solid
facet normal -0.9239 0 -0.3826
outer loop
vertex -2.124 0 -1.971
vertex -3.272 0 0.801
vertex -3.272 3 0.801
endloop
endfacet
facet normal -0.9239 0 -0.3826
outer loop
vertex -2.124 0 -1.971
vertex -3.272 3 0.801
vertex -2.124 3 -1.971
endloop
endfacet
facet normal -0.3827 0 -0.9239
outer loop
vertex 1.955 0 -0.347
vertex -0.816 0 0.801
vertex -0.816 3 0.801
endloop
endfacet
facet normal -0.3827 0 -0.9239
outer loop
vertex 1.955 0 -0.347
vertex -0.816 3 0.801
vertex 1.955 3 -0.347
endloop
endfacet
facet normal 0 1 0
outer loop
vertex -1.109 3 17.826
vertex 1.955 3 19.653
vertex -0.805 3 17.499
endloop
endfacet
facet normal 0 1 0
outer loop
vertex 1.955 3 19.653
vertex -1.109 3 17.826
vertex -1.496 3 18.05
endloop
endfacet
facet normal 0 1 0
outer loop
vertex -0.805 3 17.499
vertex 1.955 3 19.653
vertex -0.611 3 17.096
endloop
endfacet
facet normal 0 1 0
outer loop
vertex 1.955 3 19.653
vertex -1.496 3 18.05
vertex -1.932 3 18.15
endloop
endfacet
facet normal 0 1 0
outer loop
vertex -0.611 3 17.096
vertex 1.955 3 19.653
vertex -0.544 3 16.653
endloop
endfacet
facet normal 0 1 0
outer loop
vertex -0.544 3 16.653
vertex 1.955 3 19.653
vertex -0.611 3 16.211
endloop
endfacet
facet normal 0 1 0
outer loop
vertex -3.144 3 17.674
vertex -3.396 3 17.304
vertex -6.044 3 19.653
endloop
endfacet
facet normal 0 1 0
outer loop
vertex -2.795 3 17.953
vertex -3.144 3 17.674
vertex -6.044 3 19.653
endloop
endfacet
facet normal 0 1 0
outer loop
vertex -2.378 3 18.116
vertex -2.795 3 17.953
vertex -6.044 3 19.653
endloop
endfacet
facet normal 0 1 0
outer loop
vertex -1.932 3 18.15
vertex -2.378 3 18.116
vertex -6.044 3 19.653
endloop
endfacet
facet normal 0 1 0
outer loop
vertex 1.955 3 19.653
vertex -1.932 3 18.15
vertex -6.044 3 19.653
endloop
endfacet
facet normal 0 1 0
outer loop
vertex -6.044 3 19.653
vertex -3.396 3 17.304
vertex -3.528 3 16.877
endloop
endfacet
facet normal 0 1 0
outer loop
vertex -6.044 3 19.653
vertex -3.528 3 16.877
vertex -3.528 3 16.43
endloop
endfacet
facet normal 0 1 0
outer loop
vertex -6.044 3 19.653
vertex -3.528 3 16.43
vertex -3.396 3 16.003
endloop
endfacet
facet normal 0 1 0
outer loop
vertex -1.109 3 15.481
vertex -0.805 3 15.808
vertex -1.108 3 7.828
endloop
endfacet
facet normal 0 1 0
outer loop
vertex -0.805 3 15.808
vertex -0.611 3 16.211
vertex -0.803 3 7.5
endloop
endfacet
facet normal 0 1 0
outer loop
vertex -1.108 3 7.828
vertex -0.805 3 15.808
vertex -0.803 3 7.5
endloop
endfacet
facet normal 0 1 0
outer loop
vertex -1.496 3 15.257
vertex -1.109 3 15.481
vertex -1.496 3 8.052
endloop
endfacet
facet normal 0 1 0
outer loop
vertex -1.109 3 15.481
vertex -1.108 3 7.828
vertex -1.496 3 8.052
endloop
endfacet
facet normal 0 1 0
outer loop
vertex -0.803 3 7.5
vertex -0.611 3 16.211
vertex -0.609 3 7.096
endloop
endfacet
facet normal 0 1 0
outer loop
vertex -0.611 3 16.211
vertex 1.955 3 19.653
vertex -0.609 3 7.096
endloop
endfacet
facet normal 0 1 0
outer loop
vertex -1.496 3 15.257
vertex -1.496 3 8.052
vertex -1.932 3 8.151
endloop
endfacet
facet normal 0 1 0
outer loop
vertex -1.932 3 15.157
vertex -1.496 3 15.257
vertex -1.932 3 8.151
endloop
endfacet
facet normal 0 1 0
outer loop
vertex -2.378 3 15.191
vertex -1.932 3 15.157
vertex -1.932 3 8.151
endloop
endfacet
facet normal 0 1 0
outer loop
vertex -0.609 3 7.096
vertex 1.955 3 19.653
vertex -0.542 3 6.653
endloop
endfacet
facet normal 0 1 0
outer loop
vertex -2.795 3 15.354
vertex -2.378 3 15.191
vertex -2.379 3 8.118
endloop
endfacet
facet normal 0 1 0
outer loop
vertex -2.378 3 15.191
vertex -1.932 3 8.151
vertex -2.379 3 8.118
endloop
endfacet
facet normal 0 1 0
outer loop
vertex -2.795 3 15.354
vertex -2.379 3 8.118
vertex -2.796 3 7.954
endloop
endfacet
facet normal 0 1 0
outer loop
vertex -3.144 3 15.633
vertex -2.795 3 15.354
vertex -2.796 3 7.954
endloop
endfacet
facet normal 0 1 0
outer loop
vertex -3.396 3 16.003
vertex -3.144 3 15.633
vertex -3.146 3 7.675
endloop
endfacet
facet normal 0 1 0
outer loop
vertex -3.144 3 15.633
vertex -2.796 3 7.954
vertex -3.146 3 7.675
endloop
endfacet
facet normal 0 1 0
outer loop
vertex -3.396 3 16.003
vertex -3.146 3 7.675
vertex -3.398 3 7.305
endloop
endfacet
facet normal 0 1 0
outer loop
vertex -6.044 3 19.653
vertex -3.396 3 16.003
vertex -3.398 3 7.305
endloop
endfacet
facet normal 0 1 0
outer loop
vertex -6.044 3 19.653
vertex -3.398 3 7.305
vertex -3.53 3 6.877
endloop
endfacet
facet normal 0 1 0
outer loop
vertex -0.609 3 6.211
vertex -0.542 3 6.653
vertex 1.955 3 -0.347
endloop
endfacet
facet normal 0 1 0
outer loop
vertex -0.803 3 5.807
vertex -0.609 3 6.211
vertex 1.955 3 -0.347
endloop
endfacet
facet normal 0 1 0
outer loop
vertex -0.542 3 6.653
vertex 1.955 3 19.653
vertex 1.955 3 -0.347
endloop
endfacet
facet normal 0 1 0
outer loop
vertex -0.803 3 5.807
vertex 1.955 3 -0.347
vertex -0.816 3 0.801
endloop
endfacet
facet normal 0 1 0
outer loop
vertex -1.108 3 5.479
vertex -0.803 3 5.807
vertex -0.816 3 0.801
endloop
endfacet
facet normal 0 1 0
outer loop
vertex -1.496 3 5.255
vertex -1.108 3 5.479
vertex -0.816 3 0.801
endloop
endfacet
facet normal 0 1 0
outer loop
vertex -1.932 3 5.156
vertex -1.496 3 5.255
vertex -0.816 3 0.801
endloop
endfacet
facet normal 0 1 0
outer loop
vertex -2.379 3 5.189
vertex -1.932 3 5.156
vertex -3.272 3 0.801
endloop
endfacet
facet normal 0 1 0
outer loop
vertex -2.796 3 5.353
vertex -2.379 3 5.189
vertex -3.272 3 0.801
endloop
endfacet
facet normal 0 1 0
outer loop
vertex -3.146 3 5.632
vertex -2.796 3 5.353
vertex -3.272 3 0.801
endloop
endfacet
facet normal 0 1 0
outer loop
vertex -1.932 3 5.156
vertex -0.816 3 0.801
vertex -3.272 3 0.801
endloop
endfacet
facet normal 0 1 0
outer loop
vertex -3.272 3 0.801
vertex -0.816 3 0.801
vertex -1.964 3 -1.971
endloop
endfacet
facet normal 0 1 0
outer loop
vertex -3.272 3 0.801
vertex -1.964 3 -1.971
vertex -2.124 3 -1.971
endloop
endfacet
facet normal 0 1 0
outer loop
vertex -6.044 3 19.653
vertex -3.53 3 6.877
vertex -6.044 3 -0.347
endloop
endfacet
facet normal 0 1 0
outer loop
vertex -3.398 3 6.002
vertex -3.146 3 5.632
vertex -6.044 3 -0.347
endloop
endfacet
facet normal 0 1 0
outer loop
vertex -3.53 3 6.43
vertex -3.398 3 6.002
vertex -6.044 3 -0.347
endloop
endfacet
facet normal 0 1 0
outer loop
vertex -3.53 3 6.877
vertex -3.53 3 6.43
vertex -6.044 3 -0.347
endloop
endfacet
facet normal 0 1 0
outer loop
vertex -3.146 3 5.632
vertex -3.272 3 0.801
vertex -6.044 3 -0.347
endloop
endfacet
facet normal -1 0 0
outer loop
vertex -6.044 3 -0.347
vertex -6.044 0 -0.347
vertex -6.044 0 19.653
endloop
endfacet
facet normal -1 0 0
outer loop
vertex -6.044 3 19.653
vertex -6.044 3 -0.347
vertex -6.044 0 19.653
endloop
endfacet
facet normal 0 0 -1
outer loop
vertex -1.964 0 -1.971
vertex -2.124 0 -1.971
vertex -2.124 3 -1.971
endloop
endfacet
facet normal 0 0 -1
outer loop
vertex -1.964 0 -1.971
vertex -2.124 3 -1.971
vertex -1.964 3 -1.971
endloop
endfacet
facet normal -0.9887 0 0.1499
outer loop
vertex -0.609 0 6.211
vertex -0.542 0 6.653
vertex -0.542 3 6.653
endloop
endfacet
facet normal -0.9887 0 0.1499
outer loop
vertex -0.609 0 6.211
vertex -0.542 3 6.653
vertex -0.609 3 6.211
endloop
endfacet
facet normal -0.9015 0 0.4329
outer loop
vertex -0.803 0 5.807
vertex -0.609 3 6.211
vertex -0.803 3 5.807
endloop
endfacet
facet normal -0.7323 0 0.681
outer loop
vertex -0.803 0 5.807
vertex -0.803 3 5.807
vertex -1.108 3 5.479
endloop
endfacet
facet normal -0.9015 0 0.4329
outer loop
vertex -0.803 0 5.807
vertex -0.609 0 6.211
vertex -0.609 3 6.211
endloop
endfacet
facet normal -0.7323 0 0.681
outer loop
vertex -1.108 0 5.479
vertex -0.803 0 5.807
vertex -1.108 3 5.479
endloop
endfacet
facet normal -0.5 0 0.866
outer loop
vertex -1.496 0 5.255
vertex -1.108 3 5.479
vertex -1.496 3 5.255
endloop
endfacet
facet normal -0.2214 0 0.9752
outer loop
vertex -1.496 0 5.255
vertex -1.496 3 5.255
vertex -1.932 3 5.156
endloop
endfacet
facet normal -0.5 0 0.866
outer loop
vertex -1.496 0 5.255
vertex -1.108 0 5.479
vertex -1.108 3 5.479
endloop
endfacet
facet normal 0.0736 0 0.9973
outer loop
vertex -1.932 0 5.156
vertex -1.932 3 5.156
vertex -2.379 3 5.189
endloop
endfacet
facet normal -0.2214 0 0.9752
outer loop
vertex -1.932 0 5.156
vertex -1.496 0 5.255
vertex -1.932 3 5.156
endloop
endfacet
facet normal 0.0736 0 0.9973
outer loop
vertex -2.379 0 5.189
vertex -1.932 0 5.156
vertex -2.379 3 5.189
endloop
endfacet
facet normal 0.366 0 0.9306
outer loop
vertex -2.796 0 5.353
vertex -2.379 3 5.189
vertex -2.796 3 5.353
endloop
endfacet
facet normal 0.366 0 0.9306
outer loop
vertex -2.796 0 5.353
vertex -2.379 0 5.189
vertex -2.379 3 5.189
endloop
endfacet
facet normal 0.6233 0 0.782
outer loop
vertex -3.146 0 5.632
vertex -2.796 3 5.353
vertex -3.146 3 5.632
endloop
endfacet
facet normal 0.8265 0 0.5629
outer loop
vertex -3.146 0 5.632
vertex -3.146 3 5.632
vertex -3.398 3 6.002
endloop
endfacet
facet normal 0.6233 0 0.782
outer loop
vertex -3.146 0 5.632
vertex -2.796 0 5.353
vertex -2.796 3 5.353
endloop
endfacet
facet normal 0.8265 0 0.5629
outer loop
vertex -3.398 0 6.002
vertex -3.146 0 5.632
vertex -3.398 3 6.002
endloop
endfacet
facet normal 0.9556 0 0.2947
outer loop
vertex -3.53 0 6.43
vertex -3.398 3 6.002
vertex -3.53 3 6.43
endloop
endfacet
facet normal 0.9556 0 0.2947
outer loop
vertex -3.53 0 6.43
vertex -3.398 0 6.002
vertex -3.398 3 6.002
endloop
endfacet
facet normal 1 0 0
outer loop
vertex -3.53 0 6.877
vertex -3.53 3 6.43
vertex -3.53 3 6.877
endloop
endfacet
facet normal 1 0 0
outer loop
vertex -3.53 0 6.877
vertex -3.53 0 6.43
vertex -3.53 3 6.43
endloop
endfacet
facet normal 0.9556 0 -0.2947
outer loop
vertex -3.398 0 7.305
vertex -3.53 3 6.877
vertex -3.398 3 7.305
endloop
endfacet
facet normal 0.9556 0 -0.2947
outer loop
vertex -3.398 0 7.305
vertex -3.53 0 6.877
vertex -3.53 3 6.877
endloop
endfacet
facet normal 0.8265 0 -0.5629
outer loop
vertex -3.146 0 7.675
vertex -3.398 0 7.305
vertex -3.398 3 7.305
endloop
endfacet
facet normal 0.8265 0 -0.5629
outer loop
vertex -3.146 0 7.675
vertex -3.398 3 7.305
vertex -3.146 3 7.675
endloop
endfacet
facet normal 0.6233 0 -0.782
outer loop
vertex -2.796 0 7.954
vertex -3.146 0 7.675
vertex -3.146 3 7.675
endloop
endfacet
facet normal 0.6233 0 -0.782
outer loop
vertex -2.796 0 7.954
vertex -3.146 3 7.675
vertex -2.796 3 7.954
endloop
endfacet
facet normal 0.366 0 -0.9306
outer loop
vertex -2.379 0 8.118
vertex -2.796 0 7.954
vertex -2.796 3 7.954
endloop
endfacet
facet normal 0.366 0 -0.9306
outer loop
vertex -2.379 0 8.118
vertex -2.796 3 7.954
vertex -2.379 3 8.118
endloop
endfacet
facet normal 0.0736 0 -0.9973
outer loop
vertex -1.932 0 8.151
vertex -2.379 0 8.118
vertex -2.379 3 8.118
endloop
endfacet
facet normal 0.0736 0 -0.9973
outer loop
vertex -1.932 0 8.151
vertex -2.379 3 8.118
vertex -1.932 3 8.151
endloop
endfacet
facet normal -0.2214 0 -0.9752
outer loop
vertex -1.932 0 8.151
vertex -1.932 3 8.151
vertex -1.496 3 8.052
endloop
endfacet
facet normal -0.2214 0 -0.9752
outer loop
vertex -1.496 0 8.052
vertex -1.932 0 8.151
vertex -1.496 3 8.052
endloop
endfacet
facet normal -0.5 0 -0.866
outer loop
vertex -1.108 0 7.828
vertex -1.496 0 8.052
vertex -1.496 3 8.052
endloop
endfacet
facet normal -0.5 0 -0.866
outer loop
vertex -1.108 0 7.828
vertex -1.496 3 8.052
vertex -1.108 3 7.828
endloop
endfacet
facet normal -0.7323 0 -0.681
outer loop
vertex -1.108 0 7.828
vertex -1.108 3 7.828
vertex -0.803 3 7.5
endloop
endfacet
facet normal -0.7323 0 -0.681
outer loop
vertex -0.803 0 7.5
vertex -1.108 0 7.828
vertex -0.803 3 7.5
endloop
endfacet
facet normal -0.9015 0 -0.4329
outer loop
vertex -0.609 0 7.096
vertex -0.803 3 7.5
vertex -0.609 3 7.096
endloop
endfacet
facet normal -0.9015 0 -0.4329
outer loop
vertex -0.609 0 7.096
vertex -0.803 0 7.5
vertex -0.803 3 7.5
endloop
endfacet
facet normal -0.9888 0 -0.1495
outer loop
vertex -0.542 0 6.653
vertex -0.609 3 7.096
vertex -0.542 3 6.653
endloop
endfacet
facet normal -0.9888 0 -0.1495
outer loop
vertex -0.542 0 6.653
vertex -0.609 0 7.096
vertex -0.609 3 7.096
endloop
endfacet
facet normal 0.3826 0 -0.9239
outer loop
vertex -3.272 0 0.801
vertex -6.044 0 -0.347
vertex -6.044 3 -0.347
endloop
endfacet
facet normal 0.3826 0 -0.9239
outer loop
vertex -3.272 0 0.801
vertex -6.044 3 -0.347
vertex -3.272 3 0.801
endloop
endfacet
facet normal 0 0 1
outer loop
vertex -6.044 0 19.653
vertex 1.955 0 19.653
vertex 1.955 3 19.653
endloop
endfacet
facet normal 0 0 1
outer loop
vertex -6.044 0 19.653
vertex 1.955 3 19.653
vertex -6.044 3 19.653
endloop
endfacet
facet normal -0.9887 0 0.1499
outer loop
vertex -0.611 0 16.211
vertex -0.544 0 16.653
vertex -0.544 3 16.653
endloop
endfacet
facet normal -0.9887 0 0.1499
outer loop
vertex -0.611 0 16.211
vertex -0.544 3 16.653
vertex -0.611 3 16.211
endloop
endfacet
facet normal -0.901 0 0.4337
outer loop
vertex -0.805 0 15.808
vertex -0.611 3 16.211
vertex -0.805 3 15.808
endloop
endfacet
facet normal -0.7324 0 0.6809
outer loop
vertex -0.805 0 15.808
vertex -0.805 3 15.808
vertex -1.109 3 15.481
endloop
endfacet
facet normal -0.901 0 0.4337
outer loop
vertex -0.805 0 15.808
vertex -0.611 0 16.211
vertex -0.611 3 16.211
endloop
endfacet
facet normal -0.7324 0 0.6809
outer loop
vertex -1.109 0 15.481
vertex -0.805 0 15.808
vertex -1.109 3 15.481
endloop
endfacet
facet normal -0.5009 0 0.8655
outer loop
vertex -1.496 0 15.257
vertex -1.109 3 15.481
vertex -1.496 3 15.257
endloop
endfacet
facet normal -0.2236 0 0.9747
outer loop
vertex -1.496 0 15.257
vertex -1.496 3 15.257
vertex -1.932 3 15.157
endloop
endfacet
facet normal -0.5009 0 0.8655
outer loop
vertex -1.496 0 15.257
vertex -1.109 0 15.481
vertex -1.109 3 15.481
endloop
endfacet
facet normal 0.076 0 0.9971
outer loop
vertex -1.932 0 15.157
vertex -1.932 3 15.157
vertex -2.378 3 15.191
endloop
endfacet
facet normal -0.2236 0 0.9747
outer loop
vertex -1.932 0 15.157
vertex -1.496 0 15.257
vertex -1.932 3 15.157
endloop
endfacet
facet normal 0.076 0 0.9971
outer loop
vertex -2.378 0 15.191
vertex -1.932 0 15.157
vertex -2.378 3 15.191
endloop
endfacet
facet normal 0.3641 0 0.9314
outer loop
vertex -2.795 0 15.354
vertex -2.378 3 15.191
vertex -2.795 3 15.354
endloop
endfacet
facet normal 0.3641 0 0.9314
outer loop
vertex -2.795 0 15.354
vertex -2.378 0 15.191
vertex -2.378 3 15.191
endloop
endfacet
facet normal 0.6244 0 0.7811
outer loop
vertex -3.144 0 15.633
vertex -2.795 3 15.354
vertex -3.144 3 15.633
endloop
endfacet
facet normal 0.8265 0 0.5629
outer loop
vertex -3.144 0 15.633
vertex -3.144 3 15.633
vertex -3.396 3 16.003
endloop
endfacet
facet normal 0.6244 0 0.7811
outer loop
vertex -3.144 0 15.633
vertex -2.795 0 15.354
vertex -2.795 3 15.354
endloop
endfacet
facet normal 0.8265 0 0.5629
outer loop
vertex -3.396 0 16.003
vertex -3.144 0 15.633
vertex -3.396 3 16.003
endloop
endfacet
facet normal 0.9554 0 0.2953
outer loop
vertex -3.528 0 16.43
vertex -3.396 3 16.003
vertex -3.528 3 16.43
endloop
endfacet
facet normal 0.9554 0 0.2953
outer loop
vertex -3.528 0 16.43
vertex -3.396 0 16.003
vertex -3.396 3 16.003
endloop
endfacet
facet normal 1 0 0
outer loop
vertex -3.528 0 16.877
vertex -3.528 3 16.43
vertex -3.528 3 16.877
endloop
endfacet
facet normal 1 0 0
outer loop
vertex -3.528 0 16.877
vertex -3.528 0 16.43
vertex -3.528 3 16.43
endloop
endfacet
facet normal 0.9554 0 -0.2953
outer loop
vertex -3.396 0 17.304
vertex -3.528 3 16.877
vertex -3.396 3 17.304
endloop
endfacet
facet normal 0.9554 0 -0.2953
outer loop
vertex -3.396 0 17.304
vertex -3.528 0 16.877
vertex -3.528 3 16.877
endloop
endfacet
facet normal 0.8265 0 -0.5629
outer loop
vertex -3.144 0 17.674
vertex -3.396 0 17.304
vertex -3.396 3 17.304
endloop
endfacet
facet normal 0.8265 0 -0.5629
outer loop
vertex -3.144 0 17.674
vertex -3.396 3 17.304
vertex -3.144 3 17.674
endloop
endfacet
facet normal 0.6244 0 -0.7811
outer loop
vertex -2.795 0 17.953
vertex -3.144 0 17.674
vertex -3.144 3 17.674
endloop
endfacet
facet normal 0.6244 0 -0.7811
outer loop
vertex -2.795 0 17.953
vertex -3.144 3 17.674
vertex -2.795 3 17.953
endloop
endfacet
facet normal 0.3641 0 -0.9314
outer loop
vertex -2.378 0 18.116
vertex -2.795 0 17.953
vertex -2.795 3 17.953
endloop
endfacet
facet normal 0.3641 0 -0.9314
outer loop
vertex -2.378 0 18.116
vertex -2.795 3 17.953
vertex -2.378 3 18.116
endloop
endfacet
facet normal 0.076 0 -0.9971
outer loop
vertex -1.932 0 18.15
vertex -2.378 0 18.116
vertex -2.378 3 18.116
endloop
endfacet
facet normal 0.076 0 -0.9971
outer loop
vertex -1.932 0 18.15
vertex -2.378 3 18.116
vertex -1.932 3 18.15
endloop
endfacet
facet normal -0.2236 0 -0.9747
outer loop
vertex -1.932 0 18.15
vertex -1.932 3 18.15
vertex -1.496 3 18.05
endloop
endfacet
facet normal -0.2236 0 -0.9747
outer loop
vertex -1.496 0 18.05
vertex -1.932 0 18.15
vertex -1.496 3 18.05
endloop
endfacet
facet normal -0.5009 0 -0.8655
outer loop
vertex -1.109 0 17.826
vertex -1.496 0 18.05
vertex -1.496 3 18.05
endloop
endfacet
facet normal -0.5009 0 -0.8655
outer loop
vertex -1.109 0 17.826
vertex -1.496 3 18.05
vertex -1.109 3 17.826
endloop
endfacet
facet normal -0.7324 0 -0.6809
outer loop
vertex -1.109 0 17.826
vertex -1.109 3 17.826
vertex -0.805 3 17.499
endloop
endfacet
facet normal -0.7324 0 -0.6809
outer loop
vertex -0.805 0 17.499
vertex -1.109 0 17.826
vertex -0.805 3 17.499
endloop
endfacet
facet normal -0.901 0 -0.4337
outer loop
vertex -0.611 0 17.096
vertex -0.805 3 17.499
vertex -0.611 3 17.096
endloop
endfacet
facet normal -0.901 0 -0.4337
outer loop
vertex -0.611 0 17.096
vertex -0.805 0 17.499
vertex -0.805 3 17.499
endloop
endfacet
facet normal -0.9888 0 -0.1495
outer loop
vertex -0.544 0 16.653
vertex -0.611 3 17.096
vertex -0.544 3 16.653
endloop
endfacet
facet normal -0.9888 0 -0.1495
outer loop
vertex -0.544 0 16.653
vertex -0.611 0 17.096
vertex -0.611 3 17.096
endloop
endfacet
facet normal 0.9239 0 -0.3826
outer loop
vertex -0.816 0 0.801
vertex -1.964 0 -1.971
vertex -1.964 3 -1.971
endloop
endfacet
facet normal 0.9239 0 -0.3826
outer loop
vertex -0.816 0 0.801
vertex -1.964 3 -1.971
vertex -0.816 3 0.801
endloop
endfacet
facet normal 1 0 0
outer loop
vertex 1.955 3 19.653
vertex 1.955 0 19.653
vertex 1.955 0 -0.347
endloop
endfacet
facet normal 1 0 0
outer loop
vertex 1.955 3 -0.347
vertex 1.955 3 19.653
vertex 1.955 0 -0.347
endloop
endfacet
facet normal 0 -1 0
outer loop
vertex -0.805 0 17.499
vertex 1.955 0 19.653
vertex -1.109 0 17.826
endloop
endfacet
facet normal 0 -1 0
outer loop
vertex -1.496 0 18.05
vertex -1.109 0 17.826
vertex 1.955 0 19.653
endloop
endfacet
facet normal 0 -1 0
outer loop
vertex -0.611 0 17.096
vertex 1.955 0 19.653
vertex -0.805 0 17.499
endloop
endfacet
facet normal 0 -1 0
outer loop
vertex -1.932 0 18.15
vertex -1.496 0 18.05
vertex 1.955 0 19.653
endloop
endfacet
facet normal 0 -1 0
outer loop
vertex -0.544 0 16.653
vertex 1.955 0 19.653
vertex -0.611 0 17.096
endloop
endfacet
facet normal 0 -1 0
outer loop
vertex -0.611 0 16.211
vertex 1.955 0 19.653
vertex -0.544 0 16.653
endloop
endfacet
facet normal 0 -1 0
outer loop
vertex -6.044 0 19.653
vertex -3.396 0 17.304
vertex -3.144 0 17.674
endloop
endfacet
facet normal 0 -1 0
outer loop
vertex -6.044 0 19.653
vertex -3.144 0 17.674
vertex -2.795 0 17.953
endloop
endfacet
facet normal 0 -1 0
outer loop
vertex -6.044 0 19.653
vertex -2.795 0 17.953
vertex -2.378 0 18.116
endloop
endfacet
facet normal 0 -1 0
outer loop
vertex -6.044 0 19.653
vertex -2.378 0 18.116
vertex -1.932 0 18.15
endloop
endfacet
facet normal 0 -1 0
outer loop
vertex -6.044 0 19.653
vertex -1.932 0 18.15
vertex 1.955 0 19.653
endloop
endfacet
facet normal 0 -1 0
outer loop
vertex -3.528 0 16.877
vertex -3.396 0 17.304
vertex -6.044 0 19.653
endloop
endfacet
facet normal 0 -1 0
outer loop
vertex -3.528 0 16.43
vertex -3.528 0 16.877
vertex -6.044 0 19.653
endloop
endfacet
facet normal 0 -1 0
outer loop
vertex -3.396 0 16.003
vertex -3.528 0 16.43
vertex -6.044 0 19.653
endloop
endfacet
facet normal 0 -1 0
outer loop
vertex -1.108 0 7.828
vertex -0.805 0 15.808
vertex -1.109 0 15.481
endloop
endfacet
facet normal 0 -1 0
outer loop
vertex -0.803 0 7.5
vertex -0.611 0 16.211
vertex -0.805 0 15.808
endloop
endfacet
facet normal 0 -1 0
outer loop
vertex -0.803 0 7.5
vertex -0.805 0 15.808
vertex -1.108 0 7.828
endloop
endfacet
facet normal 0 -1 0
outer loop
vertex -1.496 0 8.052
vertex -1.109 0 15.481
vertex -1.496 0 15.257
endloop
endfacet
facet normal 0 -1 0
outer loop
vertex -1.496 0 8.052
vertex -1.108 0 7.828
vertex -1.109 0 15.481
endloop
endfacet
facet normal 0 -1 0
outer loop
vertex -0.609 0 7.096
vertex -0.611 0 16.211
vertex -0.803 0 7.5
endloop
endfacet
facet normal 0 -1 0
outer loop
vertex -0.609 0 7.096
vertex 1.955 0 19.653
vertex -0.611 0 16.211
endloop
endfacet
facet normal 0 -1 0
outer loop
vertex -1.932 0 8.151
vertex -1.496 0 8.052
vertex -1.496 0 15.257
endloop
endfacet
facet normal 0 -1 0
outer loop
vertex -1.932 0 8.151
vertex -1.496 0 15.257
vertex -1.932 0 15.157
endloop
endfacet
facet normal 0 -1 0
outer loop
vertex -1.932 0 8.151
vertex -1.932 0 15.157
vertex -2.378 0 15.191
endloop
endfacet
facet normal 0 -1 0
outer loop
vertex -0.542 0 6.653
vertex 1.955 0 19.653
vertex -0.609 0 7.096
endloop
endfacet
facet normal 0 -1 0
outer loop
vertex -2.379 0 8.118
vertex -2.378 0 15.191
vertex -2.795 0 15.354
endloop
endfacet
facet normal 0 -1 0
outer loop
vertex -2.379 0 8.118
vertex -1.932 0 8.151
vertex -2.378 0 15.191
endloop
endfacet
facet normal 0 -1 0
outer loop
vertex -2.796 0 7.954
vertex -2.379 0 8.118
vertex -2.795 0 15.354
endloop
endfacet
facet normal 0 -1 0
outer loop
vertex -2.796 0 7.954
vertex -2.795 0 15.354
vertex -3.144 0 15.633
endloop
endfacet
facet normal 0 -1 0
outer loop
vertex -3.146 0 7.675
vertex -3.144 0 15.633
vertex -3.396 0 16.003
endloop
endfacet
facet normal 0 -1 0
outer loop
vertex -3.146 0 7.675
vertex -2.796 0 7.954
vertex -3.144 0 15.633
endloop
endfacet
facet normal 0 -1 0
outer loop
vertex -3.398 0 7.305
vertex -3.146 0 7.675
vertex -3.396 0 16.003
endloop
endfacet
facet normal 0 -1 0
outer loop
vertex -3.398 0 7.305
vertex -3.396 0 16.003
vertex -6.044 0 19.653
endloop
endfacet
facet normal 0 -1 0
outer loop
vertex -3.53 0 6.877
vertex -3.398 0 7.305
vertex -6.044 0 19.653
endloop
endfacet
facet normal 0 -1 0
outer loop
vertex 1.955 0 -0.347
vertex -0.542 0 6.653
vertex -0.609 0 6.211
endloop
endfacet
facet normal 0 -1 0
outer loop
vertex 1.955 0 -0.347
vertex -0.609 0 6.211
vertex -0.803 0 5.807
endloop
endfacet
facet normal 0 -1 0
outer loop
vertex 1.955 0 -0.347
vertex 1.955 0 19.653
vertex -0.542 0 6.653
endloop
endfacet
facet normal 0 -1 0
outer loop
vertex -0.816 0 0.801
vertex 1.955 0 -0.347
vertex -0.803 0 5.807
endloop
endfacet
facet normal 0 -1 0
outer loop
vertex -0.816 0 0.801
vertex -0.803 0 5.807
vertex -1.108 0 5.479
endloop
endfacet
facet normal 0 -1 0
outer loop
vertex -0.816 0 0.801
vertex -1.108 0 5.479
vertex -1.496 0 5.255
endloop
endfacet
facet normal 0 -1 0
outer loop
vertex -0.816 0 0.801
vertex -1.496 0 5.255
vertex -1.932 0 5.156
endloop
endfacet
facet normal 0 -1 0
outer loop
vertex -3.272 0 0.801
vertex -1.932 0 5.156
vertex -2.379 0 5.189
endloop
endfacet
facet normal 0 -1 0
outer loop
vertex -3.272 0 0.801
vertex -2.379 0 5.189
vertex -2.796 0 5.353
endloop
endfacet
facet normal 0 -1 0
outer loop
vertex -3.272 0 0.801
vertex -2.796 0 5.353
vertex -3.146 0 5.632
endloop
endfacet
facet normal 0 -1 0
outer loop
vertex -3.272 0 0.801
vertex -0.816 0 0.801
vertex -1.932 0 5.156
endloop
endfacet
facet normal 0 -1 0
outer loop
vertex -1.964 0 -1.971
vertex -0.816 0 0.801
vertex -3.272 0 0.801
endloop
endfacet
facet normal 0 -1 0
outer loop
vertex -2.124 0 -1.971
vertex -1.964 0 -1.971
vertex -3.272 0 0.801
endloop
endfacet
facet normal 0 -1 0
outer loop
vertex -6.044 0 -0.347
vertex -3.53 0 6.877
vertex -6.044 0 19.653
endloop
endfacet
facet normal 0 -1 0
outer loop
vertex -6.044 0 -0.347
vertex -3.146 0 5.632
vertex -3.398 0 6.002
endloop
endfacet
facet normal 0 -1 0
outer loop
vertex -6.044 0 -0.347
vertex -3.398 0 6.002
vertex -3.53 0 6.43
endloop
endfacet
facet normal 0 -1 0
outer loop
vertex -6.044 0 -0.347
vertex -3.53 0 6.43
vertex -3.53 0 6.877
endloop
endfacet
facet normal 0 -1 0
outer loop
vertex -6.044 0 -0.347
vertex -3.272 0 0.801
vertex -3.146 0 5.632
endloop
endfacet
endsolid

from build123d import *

# Parameters (mm, degrees)
SKETCH1_R           = 1.502144761
SKETCH1_R_2         = 1.500235367
BOSS_EXTRUDE3_DEPTH = 3


with BuildPart() as part:
    # Sketch1 → Boss-Extrude3 (new body)
    with BuildSketch(Plane(origin=(0, 0, 0), x_dir=(1, 0, 0), z_dir=(0, 1, 0))):
        Polygon((-3.272270882, -0.800771607), (-2.124220585, 1.970866991), (-1.964220585, 1.970866991), (-0.816170288, -0.800771607), (1.95546831, 0.34727869), (1.95546831, -17.15272131), (1.95546831, -19.653488119), (-6.043909479, -19.653488119), (-6.043909479, -17.27772131), (-6.043909479, -4.77772131), (-6.043909479, 0.34727869), align=None)
        with Locations((-2.04453169, -6.653488119)):
            Circle(SKETCH1_R, mode=Mode.SUBTRACT)
        with Locations((-2.04453169, -16.653488119)):
            Circle(SKETCH1_R_2, mode=Mode.SUBTRACT)
    extrude(amount=BOSS_EXTRUDE3_DEPTH)


solid = part.part
